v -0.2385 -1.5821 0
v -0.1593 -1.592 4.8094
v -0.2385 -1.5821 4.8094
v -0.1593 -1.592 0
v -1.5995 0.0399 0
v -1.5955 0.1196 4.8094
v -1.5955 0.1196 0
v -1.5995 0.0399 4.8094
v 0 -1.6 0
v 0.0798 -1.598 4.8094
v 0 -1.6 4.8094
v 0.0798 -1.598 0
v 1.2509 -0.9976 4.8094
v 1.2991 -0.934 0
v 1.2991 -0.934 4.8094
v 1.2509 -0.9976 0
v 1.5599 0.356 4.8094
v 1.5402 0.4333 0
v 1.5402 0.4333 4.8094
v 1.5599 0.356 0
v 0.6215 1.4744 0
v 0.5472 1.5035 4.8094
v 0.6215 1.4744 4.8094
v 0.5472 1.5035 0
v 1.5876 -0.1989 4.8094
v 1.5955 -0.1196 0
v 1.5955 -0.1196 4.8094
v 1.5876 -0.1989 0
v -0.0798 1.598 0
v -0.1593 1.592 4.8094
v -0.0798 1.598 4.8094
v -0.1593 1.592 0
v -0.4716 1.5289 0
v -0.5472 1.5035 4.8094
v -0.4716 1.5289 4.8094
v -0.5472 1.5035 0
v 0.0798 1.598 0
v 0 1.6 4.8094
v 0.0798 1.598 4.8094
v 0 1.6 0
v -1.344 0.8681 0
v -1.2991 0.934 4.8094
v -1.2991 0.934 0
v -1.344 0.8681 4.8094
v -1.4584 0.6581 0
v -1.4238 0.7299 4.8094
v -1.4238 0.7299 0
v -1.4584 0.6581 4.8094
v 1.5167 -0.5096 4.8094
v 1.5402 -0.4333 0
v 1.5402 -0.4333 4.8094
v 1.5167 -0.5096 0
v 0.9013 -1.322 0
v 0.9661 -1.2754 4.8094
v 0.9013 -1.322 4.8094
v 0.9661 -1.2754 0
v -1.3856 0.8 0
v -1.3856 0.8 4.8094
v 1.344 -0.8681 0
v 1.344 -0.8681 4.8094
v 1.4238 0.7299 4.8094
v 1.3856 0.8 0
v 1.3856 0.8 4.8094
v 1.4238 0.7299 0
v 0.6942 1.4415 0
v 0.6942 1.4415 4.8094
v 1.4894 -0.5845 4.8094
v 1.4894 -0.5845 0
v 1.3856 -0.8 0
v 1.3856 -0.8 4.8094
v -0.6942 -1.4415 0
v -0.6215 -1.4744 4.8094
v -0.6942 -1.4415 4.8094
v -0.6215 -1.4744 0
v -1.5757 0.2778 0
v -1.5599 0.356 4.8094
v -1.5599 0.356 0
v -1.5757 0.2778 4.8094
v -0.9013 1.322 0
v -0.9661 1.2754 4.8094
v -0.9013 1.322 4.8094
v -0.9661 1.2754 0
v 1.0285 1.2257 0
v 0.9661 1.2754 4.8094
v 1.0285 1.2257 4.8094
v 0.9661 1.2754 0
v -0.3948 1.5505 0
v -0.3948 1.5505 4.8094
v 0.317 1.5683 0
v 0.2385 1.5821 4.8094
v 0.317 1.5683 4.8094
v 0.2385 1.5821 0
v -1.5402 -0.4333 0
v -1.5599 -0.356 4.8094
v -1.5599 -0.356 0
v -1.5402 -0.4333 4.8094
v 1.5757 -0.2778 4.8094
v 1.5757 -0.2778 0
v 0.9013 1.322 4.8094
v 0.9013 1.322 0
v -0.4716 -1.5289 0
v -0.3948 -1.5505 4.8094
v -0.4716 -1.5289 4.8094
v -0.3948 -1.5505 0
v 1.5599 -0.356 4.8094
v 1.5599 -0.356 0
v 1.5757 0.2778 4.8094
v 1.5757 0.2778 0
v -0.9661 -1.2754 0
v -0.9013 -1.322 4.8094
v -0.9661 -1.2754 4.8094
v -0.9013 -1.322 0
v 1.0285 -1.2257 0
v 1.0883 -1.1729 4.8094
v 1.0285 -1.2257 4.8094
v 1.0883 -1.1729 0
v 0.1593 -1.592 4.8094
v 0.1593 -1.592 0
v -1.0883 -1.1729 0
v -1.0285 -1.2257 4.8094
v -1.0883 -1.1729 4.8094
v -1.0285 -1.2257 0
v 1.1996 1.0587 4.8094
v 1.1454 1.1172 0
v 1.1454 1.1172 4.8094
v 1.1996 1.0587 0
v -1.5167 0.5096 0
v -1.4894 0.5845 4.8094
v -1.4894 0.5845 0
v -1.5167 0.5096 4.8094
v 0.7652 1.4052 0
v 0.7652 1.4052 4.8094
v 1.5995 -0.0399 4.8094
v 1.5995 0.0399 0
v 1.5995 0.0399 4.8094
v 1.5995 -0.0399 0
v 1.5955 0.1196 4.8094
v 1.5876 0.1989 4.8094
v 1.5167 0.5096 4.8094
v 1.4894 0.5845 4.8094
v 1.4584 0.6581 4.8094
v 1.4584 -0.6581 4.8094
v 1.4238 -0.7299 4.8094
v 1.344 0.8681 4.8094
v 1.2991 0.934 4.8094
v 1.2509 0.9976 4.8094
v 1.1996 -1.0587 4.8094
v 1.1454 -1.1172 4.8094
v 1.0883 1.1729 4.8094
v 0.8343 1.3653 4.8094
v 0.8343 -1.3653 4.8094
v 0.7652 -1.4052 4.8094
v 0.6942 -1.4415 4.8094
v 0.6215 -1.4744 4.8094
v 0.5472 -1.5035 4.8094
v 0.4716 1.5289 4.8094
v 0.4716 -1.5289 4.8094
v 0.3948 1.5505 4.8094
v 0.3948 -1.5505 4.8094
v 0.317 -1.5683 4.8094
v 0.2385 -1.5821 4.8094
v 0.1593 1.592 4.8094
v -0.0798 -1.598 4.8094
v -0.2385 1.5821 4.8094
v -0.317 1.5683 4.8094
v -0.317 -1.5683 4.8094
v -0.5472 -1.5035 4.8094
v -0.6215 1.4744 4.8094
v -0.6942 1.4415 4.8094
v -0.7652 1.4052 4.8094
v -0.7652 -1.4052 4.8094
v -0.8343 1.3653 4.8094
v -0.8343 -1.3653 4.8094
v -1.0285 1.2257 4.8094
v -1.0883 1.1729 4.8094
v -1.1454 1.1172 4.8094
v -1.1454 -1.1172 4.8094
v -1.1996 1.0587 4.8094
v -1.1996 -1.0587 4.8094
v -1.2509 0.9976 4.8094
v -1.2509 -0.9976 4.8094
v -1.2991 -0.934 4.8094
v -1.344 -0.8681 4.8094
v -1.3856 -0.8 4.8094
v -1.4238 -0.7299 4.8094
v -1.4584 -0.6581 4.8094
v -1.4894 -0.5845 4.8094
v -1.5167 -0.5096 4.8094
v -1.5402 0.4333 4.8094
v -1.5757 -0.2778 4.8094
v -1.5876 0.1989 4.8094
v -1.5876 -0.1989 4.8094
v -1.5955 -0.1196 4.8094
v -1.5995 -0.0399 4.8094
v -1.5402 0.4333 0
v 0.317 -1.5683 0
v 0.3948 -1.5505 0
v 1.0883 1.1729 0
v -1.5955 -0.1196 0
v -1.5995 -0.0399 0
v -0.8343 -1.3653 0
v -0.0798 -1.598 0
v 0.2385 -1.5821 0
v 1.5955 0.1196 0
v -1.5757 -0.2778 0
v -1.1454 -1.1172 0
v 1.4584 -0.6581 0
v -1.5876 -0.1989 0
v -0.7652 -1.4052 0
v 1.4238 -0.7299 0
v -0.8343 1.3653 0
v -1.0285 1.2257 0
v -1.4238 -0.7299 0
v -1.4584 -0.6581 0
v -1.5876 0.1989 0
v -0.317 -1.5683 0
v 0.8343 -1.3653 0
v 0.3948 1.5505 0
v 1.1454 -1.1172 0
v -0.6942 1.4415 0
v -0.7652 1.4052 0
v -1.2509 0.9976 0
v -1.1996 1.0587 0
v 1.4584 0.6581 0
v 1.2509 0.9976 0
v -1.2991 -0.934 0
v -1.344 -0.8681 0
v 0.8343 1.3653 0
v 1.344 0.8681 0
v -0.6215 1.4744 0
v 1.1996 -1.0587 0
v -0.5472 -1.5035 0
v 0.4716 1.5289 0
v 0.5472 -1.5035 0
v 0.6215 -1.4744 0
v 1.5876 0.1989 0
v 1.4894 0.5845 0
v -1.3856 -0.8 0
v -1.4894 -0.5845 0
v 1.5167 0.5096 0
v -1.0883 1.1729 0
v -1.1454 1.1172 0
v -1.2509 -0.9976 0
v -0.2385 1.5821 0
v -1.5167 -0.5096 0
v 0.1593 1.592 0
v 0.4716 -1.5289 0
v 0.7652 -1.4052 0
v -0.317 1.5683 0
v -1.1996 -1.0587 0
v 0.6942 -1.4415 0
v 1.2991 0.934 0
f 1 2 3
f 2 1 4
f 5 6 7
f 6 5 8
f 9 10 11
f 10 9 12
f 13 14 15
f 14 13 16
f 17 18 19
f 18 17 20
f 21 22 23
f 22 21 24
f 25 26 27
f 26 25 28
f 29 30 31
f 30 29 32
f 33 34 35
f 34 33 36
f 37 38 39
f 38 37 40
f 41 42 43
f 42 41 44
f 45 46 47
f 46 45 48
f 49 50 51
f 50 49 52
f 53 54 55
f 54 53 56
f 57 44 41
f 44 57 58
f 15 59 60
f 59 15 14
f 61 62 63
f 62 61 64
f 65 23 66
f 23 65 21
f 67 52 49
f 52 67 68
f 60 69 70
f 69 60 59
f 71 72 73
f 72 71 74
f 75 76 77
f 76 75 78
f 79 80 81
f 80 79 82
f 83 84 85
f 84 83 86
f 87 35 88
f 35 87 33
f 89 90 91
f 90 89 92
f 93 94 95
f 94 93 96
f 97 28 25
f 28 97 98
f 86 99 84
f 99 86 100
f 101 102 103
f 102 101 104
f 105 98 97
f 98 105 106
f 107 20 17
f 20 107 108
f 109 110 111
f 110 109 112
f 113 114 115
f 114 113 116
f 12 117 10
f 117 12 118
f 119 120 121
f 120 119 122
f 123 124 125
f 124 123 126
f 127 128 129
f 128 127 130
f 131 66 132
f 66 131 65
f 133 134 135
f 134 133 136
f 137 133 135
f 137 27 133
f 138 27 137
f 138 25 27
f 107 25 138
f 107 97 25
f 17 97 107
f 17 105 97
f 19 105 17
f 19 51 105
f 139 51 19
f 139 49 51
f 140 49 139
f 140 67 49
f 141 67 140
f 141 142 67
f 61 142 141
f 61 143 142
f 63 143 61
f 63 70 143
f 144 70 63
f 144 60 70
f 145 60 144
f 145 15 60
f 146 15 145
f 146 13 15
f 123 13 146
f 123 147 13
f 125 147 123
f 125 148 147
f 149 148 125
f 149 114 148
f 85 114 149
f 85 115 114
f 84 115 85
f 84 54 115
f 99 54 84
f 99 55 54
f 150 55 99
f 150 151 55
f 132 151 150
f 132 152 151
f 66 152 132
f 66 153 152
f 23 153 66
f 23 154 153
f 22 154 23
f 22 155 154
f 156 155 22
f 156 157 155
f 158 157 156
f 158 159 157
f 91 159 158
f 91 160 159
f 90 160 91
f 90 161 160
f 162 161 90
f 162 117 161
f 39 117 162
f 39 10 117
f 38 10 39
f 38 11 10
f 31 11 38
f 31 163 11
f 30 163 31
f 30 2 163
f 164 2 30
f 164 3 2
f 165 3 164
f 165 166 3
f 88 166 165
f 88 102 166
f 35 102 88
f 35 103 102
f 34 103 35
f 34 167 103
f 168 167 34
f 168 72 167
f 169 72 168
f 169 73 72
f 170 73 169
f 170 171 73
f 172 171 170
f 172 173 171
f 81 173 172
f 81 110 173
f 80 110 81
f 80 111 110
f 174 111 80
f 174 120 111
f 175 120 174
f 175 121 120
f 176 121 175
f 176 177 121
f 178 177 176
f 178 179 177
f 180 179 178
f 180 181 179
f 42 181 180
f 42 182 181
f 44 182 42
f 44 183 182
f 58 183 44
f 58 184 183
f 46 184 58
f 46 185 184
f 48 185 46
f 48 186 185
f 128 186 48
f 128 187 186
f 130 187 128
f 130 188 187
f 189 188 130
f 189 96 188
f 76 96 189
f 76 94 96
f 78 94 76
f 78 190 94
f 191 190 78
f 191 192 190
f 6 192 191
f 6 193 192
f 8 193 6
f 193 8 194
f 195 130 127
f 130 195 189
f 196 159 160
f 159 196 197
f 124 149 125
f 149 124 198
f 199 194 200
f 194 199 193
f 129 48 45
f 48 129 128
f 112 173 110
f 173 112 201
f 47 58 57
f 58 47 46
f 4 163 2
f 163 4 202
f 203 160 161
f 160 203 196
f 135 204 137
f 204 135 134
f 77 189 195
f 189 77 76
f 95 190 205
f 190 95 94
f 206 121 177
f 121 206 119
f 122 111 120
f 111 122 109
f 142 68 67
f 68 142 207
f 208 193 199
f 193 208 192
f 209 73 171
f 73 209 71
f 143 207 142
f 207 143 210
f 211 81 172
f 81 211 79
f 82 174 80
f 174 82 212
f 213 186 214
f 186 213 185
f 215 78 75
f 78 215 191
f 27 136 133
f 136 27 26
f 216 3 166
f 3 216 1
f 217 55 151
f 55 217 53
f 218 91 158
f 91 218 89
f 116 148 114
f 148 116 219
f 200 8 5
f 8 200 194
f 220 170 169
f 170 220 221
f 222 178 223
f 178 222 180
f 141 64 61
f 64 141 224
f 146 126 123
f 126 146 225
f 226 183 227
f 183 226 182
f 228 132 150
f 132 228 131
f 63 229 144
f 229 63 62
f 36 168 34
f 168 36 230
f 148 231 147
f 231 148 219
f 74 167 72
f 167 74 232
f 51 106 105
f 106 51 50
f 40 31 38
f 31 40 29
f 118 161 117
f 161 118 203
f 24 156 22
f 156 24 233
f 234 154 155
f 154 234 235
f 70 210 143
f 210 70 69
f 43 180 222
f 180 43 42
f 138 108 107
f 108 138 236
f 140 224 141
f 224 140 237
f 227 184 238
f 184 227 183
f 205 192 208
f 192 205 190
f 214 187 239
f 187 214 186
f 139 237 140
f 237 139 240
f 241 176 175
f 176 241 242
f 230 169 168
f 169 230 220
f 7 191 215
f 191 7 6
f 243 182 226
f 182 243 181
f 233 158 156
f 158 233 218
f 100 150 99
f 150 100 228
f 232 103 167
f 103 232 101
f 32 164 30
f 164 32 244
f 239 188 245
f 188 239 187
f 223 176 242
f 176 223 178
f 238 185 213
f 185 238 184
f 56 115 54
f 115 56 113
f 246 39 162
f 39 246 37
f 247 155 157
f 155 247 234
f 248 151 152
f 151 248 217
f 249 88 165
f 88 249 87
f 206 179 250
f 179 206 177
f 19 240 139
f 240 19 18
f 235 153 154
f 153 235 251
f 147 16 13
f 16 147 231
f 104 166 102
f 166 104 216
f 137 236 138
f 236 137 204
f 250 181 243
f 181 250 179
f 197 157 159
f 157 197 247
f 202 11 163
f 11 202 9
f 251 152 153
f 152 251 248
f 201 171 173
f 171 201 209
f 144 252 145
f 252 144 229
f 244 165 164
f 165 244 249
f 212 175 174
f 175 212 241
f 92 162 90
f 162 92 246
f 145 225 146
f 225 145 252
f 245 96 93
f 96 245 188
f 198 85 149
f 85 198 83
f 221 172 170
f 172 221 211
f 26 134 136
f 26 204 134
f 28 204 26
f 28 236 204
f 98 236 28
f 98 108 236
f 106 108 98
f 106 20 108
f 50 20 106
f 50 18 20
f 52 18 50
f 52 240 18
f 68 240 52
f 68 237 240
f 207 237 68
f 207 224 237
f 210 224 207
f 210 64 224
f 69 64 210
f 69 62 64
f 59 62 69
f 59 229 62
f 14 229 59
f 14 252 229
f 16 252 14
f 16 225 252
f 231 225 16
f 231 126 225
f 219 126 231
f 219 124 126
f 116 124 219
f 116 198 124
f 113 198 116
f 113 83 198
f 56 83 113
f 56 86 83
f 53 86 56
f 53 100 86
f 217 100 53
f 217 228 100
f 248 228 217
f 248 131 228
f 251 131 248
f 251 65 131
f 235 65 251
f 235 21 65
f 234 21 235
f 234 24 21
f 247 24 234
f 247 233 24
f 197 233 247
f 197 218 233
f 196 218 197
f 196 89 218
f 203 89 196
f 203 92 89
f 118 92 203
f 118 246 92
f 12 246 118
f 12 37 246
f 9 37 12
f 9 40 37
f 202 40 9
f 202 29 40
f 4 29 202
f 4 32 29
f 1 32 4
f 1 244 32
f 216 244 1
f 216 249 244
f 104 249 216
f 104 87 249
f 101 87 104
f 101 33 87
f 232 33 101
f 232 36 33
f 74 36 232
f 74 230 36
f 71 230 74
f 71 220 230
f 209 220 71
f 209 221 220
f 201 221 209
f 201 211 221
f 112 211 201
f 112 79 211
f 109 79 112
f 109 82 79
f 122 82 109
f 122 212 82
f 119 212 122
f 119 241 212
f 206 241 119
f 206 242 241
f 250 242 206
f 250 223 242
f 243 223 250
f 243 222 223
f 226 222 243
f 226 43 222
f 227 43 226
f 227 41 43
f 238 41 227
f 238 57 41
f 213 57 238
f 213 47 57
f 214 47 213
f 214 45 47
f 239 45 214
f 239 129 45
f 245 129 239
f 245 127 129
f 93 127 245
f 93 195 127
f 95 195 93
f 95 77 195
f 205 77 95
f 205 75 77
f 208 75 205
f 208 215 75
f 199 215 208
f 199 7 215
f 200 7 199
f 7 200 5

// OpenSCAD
// file: ../p/stud.scad
use <../lib.scad>
use <4-4cyli.scad>
use <4-4disc.scad>
use <4-4edge.scad>
$fa=1; $fs=0.2;
function ldraw_lib__stud(realsolid=false) = realsolid ? 
    [openscad(translate([0,0,-eps()], o=cylinder(4+eps(), r=6)),2)] : [
// 0 Stud
// 0 Name: stud.dat
// 0 Author: James Jessiman
// 0 !LDRAW_ORG Primitive UPDATE 2012-01
// 0 !LICENSE Licensed under CC BY 2.0 and CC BY 4.0 : see CAreadme.txt
// 
// 0 BFC CERTIFY CCW
  [0,"BFC","CERTIFY"],
  [0,"BFC","CCW"],
// 
// 0 !HISTORY 2002-04-04 [sbliss] Modified for BFC compliance
// 0 !HISTORY 2002-04-25 [PTadmin] Official Update 2002-02
// 0 !HISTORY 2007-06-24 [PTadmin] Header formatted for Contributor Agreement
// 0 !HISTORY 2008-07-01 [PTadmin] Official Update 2008-01
// 0 !HISTORY 2012-02-16 [Philo] Changed to CCW
// 0 !HISTORY 2012-03-30 [PTadmin] Official Update 2012-01
// 
// 
// 1 16 0 0 0 6 0 0 0 1 0 0 0 6 4-4edge.dat
  [1,16,0,0,0,6,0,0,0,1,0,0,0,6, ldraw_lib__4_4edge(realsolid)],
// 1 16 0 -4 0 6 0 0 0 1 0 0 0 6 4-4edge.dat
  [1,16,0,-4,0,6,0,0,0,1,0,0,0,6, ldraw_lib__4_4edge(realsolid)],
// 1 16 0 0 0 6 0 0 0 -4 0 0 0 6 4-4cyli.dat
  [1,16,0,0,0,6,0,0,0,-4,0,0,0,6, ldraw_lib__4_4cyli(realsolid)],
// 1 16 0 -4 0 6 0 0 0 1 0 0 0 6 4-4disc.dat
  [1,16,0,-4,0,6,0,0,0,1,0,0,0,6, ldraw_lib__4_4disc(realsolid)],
];
module ldraw_lib__stud(step=0, col=false, unit=2/5, alt=false, line=0.2, solid=!$preview)
    makepoly(ldraw_lib__stud(solid), step=step, col=col, unit=unit, alt=alt, line=line, solid=solid);
ldraw_lib__stud(line=0.2);
// file: ../p/box4t.scad
use <../lib.scad>
$fa=1; $fs=0.2;
function ldraw_lib__box4t(realsolid=false) = [
// 0 Box with 4 Adjacent Faces and All Edges
// 0 Name: box4t.dat
// 0 Author: Tore Eriksson [Tore_Eriksson]
// 0 !LDRAW_ORG Primitive UPDATE 2003-02
// 0 !LICENSE Licensed under CC BY 2.0 and CC BY 4.0 : see CAreadme.txt
// 
// 0 BFC CERTIFY CCW
  [0,"BFC","CERTIFY"],
  [0,"BFC","CCW"],
// 
// 0 !HISTORY 1997-09-29 [PTadmin] Official Update 1997-15
// 0 !HISTORY 2002-08-31 [izanette] Modified with WINDZ for BFC compliance
// 0 !HISTORY 2003-08-01 [PTadmin] Official Update 2003-02
// 0 !HISTORY 2007-06-24 [PTadmin] Header formatted for Contributor Agreement
// 0 !HISTORY 2008-07-01 [PTadmin] Official Update 2008-01
// 
// 
// 2 24 1 1 1 -1 1 1
  [2,24,1,1,1,-1,1,1],
// 2 24 -1 1 1 -1 1 -1
  [2,24,-1,1,1,-1,1,-1],
// 2 24 -1 1 -1 1 1 -1
  [2,24,-1,1,-1,1,1,-1],
// 2 24 1 1 -1 1 1 1
  [2,24,1,1,-1,1,1,1],
// 2 24 1 0 1 -1 0 1
  [2,24,1,0,1,-1,0,1],
// 2 24 -1 0 1 -1 0 -1
  [2,24,-1,0,1,-1,0,-1],
// 2 24 -1 0 -1 1 0 -1
  [2,24,-1,0,-1,1,0,-1],
// 2 24 1 0 -1 1 0 1
  [2,24,1,0,-1,1,0,1],
// 2 24 1 0 1 1 1 1
  [2,24,1,0,1,1,1,1],
// 2 24 -1 0 1 -1 1 1
  [2,24,-1,0,1,-1,1,1],
// 2 24 1 0 -1 1 1 -1
  [2,24,1,0,-1,1,1,-1],
// 2 24 -1 0 -1 -1 1 -1
  [2,24,-1,0,-1,-1,1,-1],
// 4 16 1 1 1 1 1 -1 -1 1 -1 -1 1 1
  [4,16,1,1,1,1,1,-1,-1,1,-1,-1,1,1],
// 4 16 1 1 1 -1 1 1 -1 0 1 1 0 1
  [4,16,1,1,1,-1,1,1,-1,0,1,1,0,1],
// 4 16 -1 1 1 -1 1 -1 -1 0 -1 -1 0 1
  [4,16,-1,1,1,-1,1,-1,-1,0,-1,-1,0,1],
// 0 4 16 -1 1 -1 -1 0 -1 1 0 -1 1 1 -1
// 4 16 1 1 -1 1 1 1 1 0 1 1 0 -1
  [4,16,1,1,-1,1,1,1,1,0,1,1,0,-1],
// 0
];
module ldraw_lib__box4t(step=0, col=false, unit=2/5, alt=false, line=0.2, solid=!$preview)
    makepoly(ldraw_lib__box4t(solid), step=step, col=col, unit=unit, alt=alt, line=line, solid=solid);
ldraw_lib__box4t(line=0.2);
// file: ../p/4-4edge.scad
use <../lib.scad>
$fa=1; $fs=0.2;
function ldraw_lib__4_4edge(realsolid=false) = [
// 0 Circle 1.0
// 0 Name: 4-4edge.dat
// 0 Author: James Jessiman
// 0 !LDRAW_ORG Primitive UPDATE 2017-01
// 0 !LICENSE Licensed under CC BY 2.0 and CC BY 4.0 : see CAreadme.txt
// 
// 0 BFC CERTIFY CCW
  [0,"BFC","CERTIFY"],
  [0,"BFC","CCW"],
// 
// 0 !HISTORY 1998-12-15 [PTadmin] Official Update 1998-10
// 0 !HISTORY 2005-12-28 [PTadmin] Official Update 2005-01
// 0 !HISTORY 2007-06-24 [PTadmin] Header formatted for Contributor Agreement
// 0 !HISTORY 2008-07-01 [PTadmin] Official Update 2008-01
// 0 !HISTORY 2017-01-15 [Steffen] BFCed
// 0 !HISTORY 2017-12-30 [PTadmin] Official Update 2017-01
// 
// 
// 2 24 1 0 0 0.9239 0 0.3827
  [2,24,1,0,0,0.9239,0,0.3827],
// 2 24 0.9239 0 0.3827 0.7071 0 0.7071
  [2,24,0.9239,0,0.3827,0.7071,0,0.7071],
// 2 24 0.7071 0 0.7071 0.3827 0 0.9239
  [2,24,0.7071,0,0.7071,0.3827,0,0.9239],
// 2 24 0.3827 0 0.9239 0 0 1
  [2,24,0.3827,0,0.9239,0,0,1],
// 2 24 0 0 1 -0.3827 0 0.9239
  [2,24,0,0,1,-0.3827,0,0.9239],
// 2 24 -0.3827 0 0.9239 -0.7071 0 0.7071
  [2,24,-0.3827,0,0.9239,-0.7071,0,0.7071],
// 2 24 -0.7071 0 0.7071 -0.9239 0 0.3827
  [2,24,-0.7071,0,0.7071,-0.9239,0,0.3827],
// 2 24 -0.9239 0 0.3827 -1 0 -0
  [2,24,-0.9239,0,0.3827,-1,0,-0],
// 2 24 -1 0 -0 -0.9239 0 -0.3827
  [2,24,-1,0,-0,-0.9239,0,-0.3827],
// 2 24 -0.9239 0 -0.3827 -0.7071 0 -0.7071
  [2,24,-0.9239,0,-0.3827,-0.7071,0,-0.7071],
// 2 24 -0.7071 0 -0.7071 -0.3827 0 -0.9239
  [2,24,-0.7071,0,-0.7071,-0.3827,0,-0.9239],
// 2 24 -0.3827 0 -0.9239 0 0 -1
  [2,24,-0.3827,0,-0.9239,0,0,-1],
// 2 24 0 0 -1 0.3827 0 -0.9239
  [2,24,0,0,-1,0.3827,0,-0.9239],
// 2 24 0.3827 0 -0.9239 0.7071 0 -0.7071
  [2,24,0.3827,0,-0.9239,0.7071,0,-0.7071],
// 2 24 0.7071 0 -0.7071 0.9239 0 -0.3827
  [2,24,0.7071,0,-0.7071,0.9239,0,-0.3827],
// 2 24 0.9239 0 -0.3827 1 0 0
  [2,24,0.9239,0,-0.3827,1,0,0],
];
module ldraw_lib__4_4edge(step=0, col=false, unit=2/5, alt=false, line=0.2, solid=!$preview)
    makepoly(ldraw_lib__4_4edge(solid), step=step, col=col, unit=unit, alt=alt, line=line, solid=solid);
ldraw_lib__4_4edge(line=0.2);
// file: ../p/4-4disc.scad
use <../lib.scad>
$fa=1; $fs=0.2;
function ldraw_lib__4_4disc(realsolid=false) = [
// 0 Disc 1.0
// 0 Name: 4-4disc.dat
// 0 Author: James Jessiman
// 0 !LDRAW_ORG Primitive UPDATE 2002-02
// 0 !LICENSE Licensed under CC BY 2.0 and CC BY 4.0 : see CAreadme.txt
// 
// 0 BFC CERTIFY CCW
  [0,"BFC","CERTIFY"],
  [0,"BFC","CCW"],
// 
// 0 !HISTORY 1998-12-15 [PTadmin] Official Update 1998-10
// 0 !HISTORY 2002-03-23 [sbliss] Added BFC statement
// 0 !HISTORY 2002-04-25 [PTadmin] Official Update 2002-02
// 0 !HISTORY 2007-06-24 [PTadmin] Header formatted for Contributor Agreement
// 0 !HISTORY 2008-07-01 [PTadmin] Official Update 2008-01
// 
// 
// 3 16 0 0 0 1 0 0 0.9239 0 0.3827
  [3,16,0,0,0,1,0,0,0.9239,0,0.3827],
// 3 16 0 0 0 0.9239 0 0.3827 0.7071 0 0.7071
  [3,16,0,0,0,0.9239,0,0.3827,0.7071,0,0.7071],
// 3 16 0 0 0 0.7071 0 0.7071 0.3827 0 0.9239
  [3,16,0,0,0,0.7071,0,0.7071,0.3827,0,0.9239],
// 3 16 0 0 0 0.3827 0 0.9239 0 0 1
  [3,16,0,0,0,0.3827,0,0.9239,0,0,1],
// 3 16 0 0 0 0 0 1 -0.3827 0 0.9239
  [3,16,0,0,0,0,0,1,-0.3827,0,0.9239],
// 3 16 0 0 0 -0.3827 0 0.9239 -0.7071 0 0.7071
  [3,16,0,0,0,-0.3827,0,0.9239,-0.7071,0,0.7071],
// 3 16 0 0 0 -0.7071 0 0.7071 -0.9239 0 0.3827
  [3,16,0,0,0,-0.7071,0,0.7071,-0.9239,0,0.3827],
// 3 16 0 0 0 -0.9239 0 0.3827 -1 0 -0
  [3,16,0,0,0,-0.9239,0,0.3827,-1,0,-0],
// 3 16 0 0 0 -1 0 -0 -0.9239 0 -0.3827
  [3,16,0,0,0,-1,0,-0,-0.9239,0,-0.3827],
// 3 16 0 0 0 -0.9239 0 -0.3827 -0.7071 0 -0.7071
  [3,16,0,0,0,-0.9239,0,-0.3827,-0.7071,0,-0.7071],
// 3 16 0 0 0 -0.7071 0 -0.7071 -0.3827 0 -0.9239
  [3,16,0,0,0,-0.7071,0,-0.7071,-0.3827,0,-0.9239],
// 3 16 0 0 0 -0.3827 0 -0.9239 0 0 -1
  [3,16,0,0,0,-0.3827,0,-0.9239,0,0,-1],
// 3 16 0 0 0 0 0 -1 0.3827 0 -0.9239
  [3,16,0,0,0,0,0,-1,0.3827,0,-0.9239],
// 3 16 0 0 0 0.3827 0 -0.9239 0.7071 0 -0.7071
  [3,16,0,0,0,0.3827,0,-0.9239,0.7071,0,-0.7071],
// 3 16 0 0 0 0.7071 0 -0.7071 0.9239 0 -0.3827
  [3,16,0,0,0,0.7071,0,-0.7071,0.9239,0,-0.3827],
// 3 16 0 0 0 0.9239 0 -0.3827 1 0 0
  [3,16,0,0,0,0.9239,0,-0.3827,1,0,0],
// 0
];
module ldraw_lib__4_4disc(step=0, col=false, unit=2/5, alt=false, line=0.2, solid=!$preview)
    makepoly(ldraw_lib__4_4disc(solid), step=step, col=col, unit=unit, alt=alt, line=line, solid=solid);
ldraw_lib__4_4disc(line=0.2);
// file: ../p/4-4cyli.scad
use <../lib.scad>
$fa=1; $fs=0.2;
function ldraw_lib__4_4cyli(realsolid=false) = [
// 0 Cylinder 1.0
// 0 Name: 4-4cyli.dat
// 0 Author: James Jessiman
// 0 !LDRAW_ORG Primitive UPDATE 2005-01
// 0 !LICENSE Licensed under CC BY 2.0 and CC BY 4.0 : see CAreadme.txt
// 
// 0 BFC CERTIFY CCW
  [0,"BFC","CERTIFY"],
  [0,"BFC","CCW"],
// 
// 0 !HISTORY 1998-12-15 [PTadmin] Official Update 1998-10
// 0 !HISTORY 2002-03-23 [sbliss] Added BFC statement; merged headers from files in distributions LDraw 0.27 and Complete.
// 0 !HISTORY 2002-04-25 [PTadmin] Official Update 2002-02
// 0 !HISTORY 2004-12-14 [guyvivan] BFC CCW
// 0 !HISTORY 2005-12-28 [PTadmin] Official Update 2005-01
// 0 !HISTORY 2007-06-24 [PTadmin] Header formatted for Contributor Agreement
// 0 !HISTORY 2008-07-01 [PTadmin] Official Update 2008-01
// 
// 
// 4 16 1 1 0 0.9239 1 0.3827 0.9239 0 0.3827 1 0 0
  [4,16,1,1,0,0.9239,1,0.3827,0.9239,0,0.3827,1,0,0],
// 5 24 1 0 0 1 1 0 0.9239 0 0.3827 0.9239 0 -0.3827
  [5,24,1,0,0,1,1,0,0.9239,0,0.3827,0.9239,0,-0.3827],
// 4 16 0.9239 1 0.3827 0.7071 1 0.7071 0.7071 0 0.7071 0.9239 0 0.3827
  [4,16,0.9239,1,0.3827,0.7071,1,0.7071,0.7071,0,0.7071,0.9239,0,0.3827],
// 5 24 0.9239 0 0.3827 0.9239 1 0.3827 0.7071 0 0.7071 1 0 0
  [5,24,0.9239,0,0.3827,0.9239,1,0.3827,0.7071,0,0.7071,1,0,0],
// 4 16 0.7071 1 0.7071 0.3827 1 0.9239 0.3827 0 0.9239 0.7071 0 0.7071
  [4,16,0.7071,1,0.7071,0.3827,1,0.9239,0.3827,0,0.9239,0.7071,0,0.7071],
// 5 24 0.7071 0 0.7071 0.7071 1 0.7071 0.3827 0 0.9239 0.9239 0 0.3827
  [5,24,0.7071,0,0.7071,0.7071,1,0.7071,0.3827,0,0.9239,0.9239,0,0.3827],
// 4 16 0.3827 1 0.9239 0 1 1 0 0 1 0.3827 0 0.9239
  [4,16,0.3827,1,0.9239,0,1,1,0,0,1,0.3827,0,0.9239],
// 5 24 0.3827 0 0.9239 0.3827 1 0.9239 0 0 1 0.7071 0 0.7071
  [5,24,0.3827,0,0.9239,0.3827,1,0.9239,0,0,1,0.7071,0,0.7071],
// 4 16 0 1 1 -0.3827 1 0.9239 -0.3827 0 0.9239 0 0 1
  [4,16,0,1,1,-0.3827,1,0.9239,-0.3827,0,0.9239,0,0,1],
// 5 24 0 0 1 0 1 1 -0.3827 0 0.9239 0.3827 0 0.9239
  [5,24,0,0,1,0,1,1,-0.3827,0,0.9239,0.3827,0,0.9239],
// 4 16 -0.3827 1 0.9239 -0.7071 1 0.7071 -0.7071 0 0.7071 -0.3827 0 0.9239
  [4,16,-0.3827,1,0.9239,-0.7071,1,0.7071,-0.7071,0,0.7071,-0.3827,0,0.9239],
// 5 24 -0.3827 0 0.9239 -0.3827 1 0.9239 -0.7071 0 0.7071 0 0 1
  [5,24,-0.3827,0,0.9239,-0.3827,1,0.9239,-0.7071,0,0.7071,0,0,1],
// 4 16 -0.7071 1 0.7071 -0.9239 1 0.3827 -0.9239 0 0.3827 -0.7071 0 0.7071
  [4,16,-0.7071,1,0.7071,-0.9239,1,0.3827,-0.9239,0,0.3827,-0.7071,0,0.7071],
// 5 24 -0.7071 0 0.7071 -0.7071 1 0.7071 -0.9239 0 0.3827 -0.3827 0 0.9239
  [5,24,-0.7071,0,0.7071,-0.7071,1,0.7071,-0.9239,0,0.3827,-0.3827,0,0.9239],
// 4 16 -0.9239 1 0.3827 -1 1 0 -1 0 0 -0.9239 0 0.3827
  [4,16,-0.9239,1,0.3827,-1,1,0,-1,0,0,-0.9239,0,0.3827],
// 5 24 -0.9239 0 0.3827 -0.9239 1 0.3827 -1 0 0 -0.7071 0 0.7071
  [5,24,-0.9239,0,0.3827,-0.9239,1,0.3827,-1,0,0,-0.7071,0,0.7071],
// 4 16 -1 1 0 -0.9239 1 -0.3827 -0.9239 0 -0.3827 -1 0 0
  [4,16,-1,1,0,-0.9239,1,-0.3827,-0.9239,0,-0.3827,-1,0,0],
// 5 24 -1 0 0 -1 1 0 -0.9239 0 -0.3827 -0.9239 0 0.3827
  [5,24,-1,0,0,-1,1,0,-0.9239,0,-0.3827,-0.9239,0,0.3827],
// 4 16 -0.9239 1 -0.3827 -0.7071 1 -0.7071 -0.7071 0 -0.7071 -0.9239 0 -0.3827
  [4,16,-0.9239,1,-0.3827,-0.7071,1,-0.7071,-0.7071,0,-0.7071,-0.9239,0,-0.3827],
// 5 24 -0.9239 0 -0.3827 -0.9239 1 -0.3827 -0.7071 0 -0.7071 -1 0 0
  [5,24,-0.9239,0,-0.3827,-0.9239,1,-0.3827,-0.7071,0,-0.7071,-1,0,0],
// 4 16 -0.7071 1 -0.7071 -0.3827 1 -0.9239 -0.3827 0 -0.9239 -0.7071 0 -0.7071
  [4,16,-0.7071,1,-0.7071,-0.3827,1,-0.9239,-0.3827,0,-0.9239,-0.7071,0,-0.7071],
// 5 24 -0.7071 0 -0.7071 -0.7071 1 -0.7071 -0.3827 0 -0.9239 -0.9239 0 -0.3827
  [5,24,-0.7071,0,-0.7071,-0.7071,1,-0.7071,-0.3827,0,-0.9239,-0.9239,0,-0.3827],
// 4 16 -0.3827 1 -0.9239 0 1 -1 0 0 -1 -0.3827 0 -0.9239
  [4,16,-0.3827,1,-0.9239,0,1,-1,0,0,-1,-0.3827,0,-0.9239],
// 5 24 -0.3827 0 -0.9239 -0.3827 1 -0.9239 0 0 -1 -0.7071 0 -0.7071
  [5,24,-0.3827,0,-0.9239,-0.3827,1,-0.9239,0,0,-1,-0.7071,0,-0.7071],
// 4 16 0 1 -1 0.3827 1 -0.9239 0.3827 0 -0.9239 0 0 -1
  [4,16,0,1,-1,0.3827,1,-0.9239,0.3827,0,-0.9239,0,0,-1],
// 5 24 0 0 -1 0 1 -1 0.3827 0 -0.9239 -0.3827 0 -0.9239
  [5,24,0,0,-1,0,1,-1,0.3827,0,-0.9239,-0.3827,0,-0.9239],
// 4 16 0.3827 1 -0.9239 0.7071 1 -0.7071 0.7071 0 -0.7071 0.3827 0 -0.9239
  [4,16,0.3827,1,-0.9239,0.7071,1,-0.7071,0.7071,0,-0.7071,0.3827,0,-0.9239],
// 5 24 0.3827 0 -0.9239 0.3827 1 -0.9239 0.7071 0 -0.7071 0 0 -1
  [5,24,0.3827,0,-0.9239,0.3827,1,-0.9239,0.7071,0,-0.7071,0,0,-1],
// 4 16 0.7071 1 -0.7071 0.9239 1 -0.3827 0.9239 0 -0.3827 0.7071 0 -0.7071
  [4,16,0.7071,1,-0.7071,0.9239,1,-0.3827,0.9239,0,-0.3827,0.7071,0,-0.7071],
// 5 24 0.7071 0 -0.7071 0.7071 1 -0.7071 0.9239 0 -0.3827 0.3827 0 -0.9239
  [5,24,0.7071,0,-0.7071,0.7071,1,-0.7071,0.9239,0,-0.3827,0.3827,0,-0.9239],
// 4 16 0.9239 1 -0.3827 1 1 0 1 0 0 0.9239 0 -0.3827
  [4,16,0.9239,1,-0.3827,1,1,0,1,0,0,0.9239,0,-0.3827],
// 5 24 0.9239 0 -0.3827 0.9239 1 -0.3827 1 0 0 0.7071 0 -0.7071
  [5,24,0.9239,0,-0.3827,0.9239,1,-0.3827,1,0,0,0.7071,0,-0.7071],
// 0
];
module ldraw_lib__4_4cyli(step=0, col=false, unit=2/5, alt=false, line=0.2, solid=!$preview)
    makepoly(ldraw_lib__4_4cyli(solid), step=step, col=col, unit=unit, alt=alt, line=line, solid=solid);
ldraw_lib__4_4cyli(line=0.2);
// file: s/3004s01.scad
use <../../lib.scad>
use <../../p/box4t.scad>
use <../../p/box5.scad>
use <../../p/stud.scad>
use <../../p/stud3.scad>
$fa=1; $fs=0.2;
function ldraw_lib__s__3004s01(realsolid=false) = [
// 0 ~Brick  1 x  2 without Front Face
// 0 Name: s\3004s01.dat
// 0 Author: James Jessiman
// 0 !LDRAW_ORG Subpart UPDATE 2003-03
// 0 !LICENSE Licensed under CC BY 2.0 and CC BY 4.0 : see CAreadme.txt
// 
// 0 BFC CERTIFY CCW
  [0,"BFC","CERTIFY"],
  [0,"BFC","CCW"],
// 
// 0 !HISTORY 2003-09-07 [jriley] Subfiling, BFC
// 0 !HISTORY 2003-12-19 [PTadmin] Official Update 2003-03
// 0 !HISTORY 2007-08-29 [PTadmin] Header formatted for Contributor Agreement
// 0 !HISTORY 2008-07-01 [PTadmin] Official Update 2008-01
// 
// 
// 1 16 0 4 0 1 0 0 0 -5 0 0 0 1 stud3.dat
  [1,16,0,4,0,1,0,0,0,-5,0,0,0,1, ldraw_lib__stud3(realsolid)],
// 0 BFC INVERTNEXT
  [0,"BFC","INVERTNEXT"],
// 1 16 0 24 0 16 0 0 0 -20 0 0 0 6 box5.dat
  [1,16,0,24,0,16,0,0,0,-20,0,0,0,6, ldraw_lib__box5(realsolid)],
// 4 16 20 24 10 16 24 6 -16 24 6 -20 24 10
  [4,16,20,24,10,16,24,6,-16,24,6,-20,24,10],
// 4 16 -20 24 10 -16 24 6 -16 24 -6 -20 24 -10
  [4,16,-20,24,10,-16,24,6,-16,24,-6,-20,24,-10],
// 4 16 -20 24 -10 -16 24 -6 16 24 -6 20 24 -10
  [4,16,-20,24,-10,-16,24,-6,16,24,-6,20,24,-10],
// 4 16 20 24 -10 16 24 -6 16 24 6 20 24 10
  [4,16,20,24,-10,16,24,-6,16,24,6,20,24,10],
// 1 16 0 24 0 20 0 0 0 -24 0 0 0 10 box4t.dat
  [1,16,0,24,0,20,0,0,0,-24,0,0,0,10, ldraw_lib__box4t(realsolid)],
// 1 16 10 0 0 1 0 0 0 1 0 0 0 1 stud.dat
  [1,16,10,0,0,1,0,0,0,1,0,0,0,1, ldraw_lib__stud(realsolid)],
// 1 16 -10 0 0 1 0 0 0 1 0 0 0 1 stud.dat
  [1,16,-10,0,0,1,0,0,0,1,0,0,0,1, ldraw_lib__stud(realsolid)],
// 0
];
module ldraw_lib__s__3004s01(step=0, col=false, unit=2/5, alt=false, line=0.2, solid=!$preview)
    makepoly(ldraw_lib__s__3004s01(solid), step=step, col=col, unit=unit, alt=alt, line=line, solid=solid);
ldraw_lib__s__3004s01(line=0.2);
// file: ../p/stud3.scad
use <../lib.scad>
use <4-4cyli.scad>
use <4-4disc.scad>
use <4-4edge.scad>
$fa=1; $fs=0.2;
function ldraw_lib__stud3(realsolid=false) = realsolid ? 
    [openscad(translate([0,0,-eps()], o=cylinder(4+eps(), r=4)),2)] : [
// 0 Stud Tube Solid
// 0 Name: stud3.dat
// 0 Author: James Jessiman
// 0 !LDRAW_ORG Primitive UPDATE 2012-01
// 0 !LICENSE Licensed under CC BY 2.0 and CC BY 4.0 : see CAreadme.txt
// 
// 0 BFC CERTIFY CCW
  [0,"BFC","CERTIFY"],
  [0,"BFC","CCW"],
// 
// 0 !HISTORY 2002-04-04 [sbliss] Modified for BFC compliance
// 0 !HISTORY 2002-04-25 [PTadmin] Official Update 2002-02
// 0 !HISTORY 2007-06-24 [PTadmin] Header formatted for Contributor Agreement
// 0 !HISTORY 2008-07-01 [PTadmin] Official Update 2008-01
// 0 !HISTORY 2012-02-16 [Philo] Changed to CCW
// 0 !HISTORY 2012-03-30 [PTadmin] Official Update 2012-01
// 
// 
// 1 16 0 -4 0 4 0 0 0 1 0 0 0 4 4-4edge.dat
  [1,16,0,-4,0,4,0,0,0,1,0,0,0,4, ldraw_lib__4_4edge(realsolid)],
// 1 16 0 0 0 4 0 0 0 1 0 0 0 4 4-4edge.dat
  [1,16,0,0,0,4,0,0,0,1,0,0,0,4, ldraw_lib__4_4edge(realsolid)],
// 1 16 0 -4 0 4 0 0 0 1 0 0 0 4 4-4disc.dat
  [1,16,0,-4,0,4,0,0,0,1,0,0,0,4, ldraw_lib__4_4disc(realsolid)],
// 1 16 0 -4 0 4 0 0 0 4 0 0 0 4 4-4cyli.dat
  [1,16,0,-4,0,4,0,0,0,4,0,0,0,4, ldraw_lib__4_4cyli(realsolid)],
];
module ldraw_lib__stud3(step=0, col=false, unit=2/5, alt=false, line=0.2, solid=!$preview)
    makepoly(ldraw_lib__stud3(solid), step=step, col=col, unit=unit, alt=alt, line=line, solid=solid);
ldraw_lib__stud3(line=0.2);
// file: ../p/box5.scad
use <../lib.scad>
$fa=1; $fs=0.2;
function ldraw_lib__box5(realsolid=false) = [
// 0 Box with 5 Faces and All Edges
// 0 Name: box5.dat
// 0 Author: James Jessiman
// 0 !LDRAW_ORG Primitive UPDATE 2012-01
// 0 !LICENSE Licensed under CC BY 2.0 and CC BY 4.0 : see CAreadme.txt
// 
// 0 BFC CERTIFY CCW
  [0,"BFC","CERTIFY"],
  [0,"BFC","CCW"],
// 
// 0 !HISTORY 2002-04-03 [sbliss] Modified for BFC compliance
// 0 !HISTORY 2002-04-25 [PTadmin] Official Update 2002-02
// 0 !HISTORY 2007-06-24 [PTadmin] Header formatted for Contributor Agreement
// 0 !HISTORY 2008-07-01 [PTadmin] Official Update 2008-01
// 0 !HISTORY 2012-02-16 [Philo] Changed to CCW
// 0 !HISTORY 2012-03-30 [PTadmin] Official Update 2012-01
// 
// 
// 2 24 1 1 1 -1 1 1
  [2,24,1,1,1,-1,1,1],
// 2 24 -1 1 1 -1 1 -1
  [2,24,-1,1,1,-1,1,-1],
// 2 24 -1 1 -1 1 1 -1
  [2,24,-1,1,-1,1,1,-1],
// 2 24 1 1 -1 1 1 1
  [2,24,1,1,-1,1,1,1],
// 2 24 1 0 1 -1 0 1
  [2,24,1,0,1,-1,0,1],
// 2 24 -1 0 1 -1 0 -1
  [2,24,-1,0,1,-1,0,-1],
// 2 24 -1 0 -1 1 0 -1
  [2,24,-1,0,-1,1,0,-1],
// 2 24 1 0 -1 1 0 1
  [2,24,1,0,-1,1,0,1],
// 2 24 1 0 1 1 1 1
  [2,24,1,0,1,1,1,1],
// 2 24 -1 0 1 -1 1 1
  [2,24,-1,0,1,-1,1,1],
// 2 24 1 0 -1 1 1 -1
  [2,24,1,0,-1,1,1,-1],
// 2 24 -1 0 -1 -1 1 -1
  [2,24,-1,0,-1,-1,1,-1],
// 4 16 -1 1 1 1 1 1 1 1 -1 -1 1 -1
  [4,16,-1,1,1,1,1,1,1,1,-1,-1,1,-1],
// 4 16 -1 1 1 -1 0 1 1 0 1 1 1 1
  [4,16,-1,1,1,-1,0,1,1,0,1,1,1,1],
// 4 16 -1 1 -1 -1 0 -1 -1 0 1 -1 1 1
  [4,16,-1,1,-1,-1,0,-1,-1,0,1,-1,1,1],
// 4 16 1 1 -1 1 0 -1 -1 0 -1 -1 1 -1
  [4,16,1,1,-1,1,0,-1,-1,0,-1,-1,1,-1],
// 4 16 1 1 1 1 0 1 1 0 -1 1 1 -1
  [4,16,1,1,1,1,0,1,1,0,-1,1,1,-1],
];
module ldraw_lib__box5(step=0, col=false, unit=2/5, alt=false, line=0.2, solid=!$preview)
    makepoly(ldraw_lib__box5(solid), step=step, col=col, unit=unit, alt=alt, line=line, solid=solid);
ldraw_lib__box5(line=0.2);
// file: ../p/box4-1.scad
use <../lib.scad>
$fa=1; $fs=0.2;
function ldraw_lib__box4_1(realsolid=false) = [
// 0 Box with 4 Faces without 1 Edge
// 0 Name: box4-1.dat
// 0 Author: Tore Eriksson [Tore_Eriksson]
// 0 !LDRAW_ORG Primitive UPDATE 2012-01
// 0 !LICENSE Licensed under CC BY 2.0 and CC BY 4.0 : see CAreadme.txt
// 
// 0 BFC CERTIFY CCW
  [0,"BFC","CERTIFY"],
  [0,"BFC","CCW"],
// 
// 0 !HISTORY 1998-07-15 [PTadmin] Official Update 1998-07
// 0 !HISTORY 2002-04-05 [hafhead] Made BFC compliant
// 0 !HISTORY 2002-04-25 [PTadmin] Official Update 2002-02
// 0 !HISTORY 2007-06-24 [PTadmin] Header formatted for Contributor Agreement
// 0 !HISTORY 2008-07-01 [PTadmin] Official Update 2008-01
// 0 !HISTORY 2012-02-16 [Philo] Changed to CCW
// 0 !HISTORY 2012-03-30 [PTadmin] Official Update 2012-01
// 
// 
// 2 24 1 1 1 -1 1 1
  [2,24,1,1,1,-1,1,1],
// 2 24 -1 1 1 -1 1 -1
  [2,24,-1,1,1,-1,1,-1],
// 2 24 -1 1 -1 1 1 -1
  [2,24,-1,1,-1,1,1,-1],
// 2 24 1 1 -1 1 1 1
  [2,24,1,1,-1,1,1,1],
// 2 24 1 0 1 -1 0 1
  [2,24,1,0,1,-1,0,1],
// 2 24 -1 0 1 -1 0 -1
  [2,24,-1,0,1,-1,0,-1],
// 2 24 1 0 -1 1 0 1
  [2,24,1,0,-1,1,0,1],
// 2 24 1 0 1 1 1 1
  [2,24,1,0,1,1,1,1],
// 2 24 -1 0 1 -1 1 1
  [2,24,-1,0,1,-1,1,1],
// 2 24 1 0 -1 1 1 -1
  [2,24,1,0,-1,1,1,-1],
// 2 24 -1 0 -1 -1 1 -1
  [2,24,-1,0,-1,-1,1,-1],
// 4 16 -1 1 1 1 1 1 1 1 -1 -1 1 -1
  [4,16,-1,1,1,1,1,1,1,1,-1,-1,1,-1],
// 4 16 -1 1 1 -1 0 1 1 0 1 1 1 1
  [4,16,-1,1,1,-1,0,1,1,0,1,1,1,1],
// 4 16 -1 1 -1 -1 0 -1 -1 0 1 -1 1 1
  [4,16,-1,1,-1,-1,0,-1,-1,0,1,-1,1,1],
// 4 16 1 1 1 1 0 1 1 0 -1 1 1 -1
  [4,16,1,1,1,1,0,1,1,0,-1,1,1,-1],
];
module ldraw_lib__box4_1(step=0, col=false, unit=2/5, alt=false, line=0.2, solid=!$preview)
    makepoly(ldraw_lib__box4_1(solid), step=step, col=col, unit=unit, alt=alt, line=line, solid=solid);
ldraw_lib__box4_1(line=0.2);
// file: ../p/box3u2p.scad
use <../lib.scad>
$fa=1; $fs=0.2;
function ldraw_lib__box3u2p(realsolid=false) = [
// 0 Box with 3 Faces without 2 Parallel Edges
// 0 Name: box3u2p.dat
// 0 Author: Niels Karsdorp [nielsk]
// 0 !LDRAW_ORG Primitive UPDATE 2012-01
// 0 !LICENSE Licensed under CC BY 2.0 and CC BY 4.0 : see CAreadme.txt
// 
// 0 BFC CERTIFY CCW
  [0,"BFC","CERTIFY"],
  [0,"BFC","CCW"],
// 
// 0 !HISTORY 2003-03-12 [PTadmin] Official Update 2003-01
// 0 !HISTORY 2007-06-24 [PTadmin] Header formatted for Contributor Agreement
// 0 !HISTORY 2008-07-01 [PTadmin] Official Update 2008-01
// 0 !HISTORY 2012-02-16 [Philo] Changed to CCW
// 0 !HISTORY 2012-03-30 [PTadmin] Official Update 2012-01
// 
// 
// 2 24 1 1 1 -1 1 1
  [2,24,1,1,1,-1,1,1],
// 2 24 -1 1 -1 1 1 -1
  [2,24,-1,1,-1,1,1,-1],
// 2 24 1 0 1 -1 0 1
  [2,24,1,0,1,-1,0,1],
// 2 24 -1 0 -1 1 0 -1
  [2,24,-1,0,-1,1,0,-1],
// 2 24 1 1 1 1 1 -1
  [2,24,1,1,1,1,1,-1],
// 2 24 -1 1 1 -1 1 -1
  [2,24,-1,1,1,-1,1,-1],
// 2 24 1 1 1 1 0 1
  [2,24,1,1,1,1,0,1],
// 2 24 1 1 -1 1 0 -1
  [2,24,1,1,-1,1,0,-1],
// 2 24 -1 1 1 -1 0 1
  [2,24,-1,1,1,-1,0,1],
// 2 24 -1 1 -1 -1 0 -1
  [2,24,-1,1,-1,-1,0,-1],
// 4 16 -1 1 -1 -1 1 1 1 1 1 1 1 -1
  [4,16,-1,1,-1,-1,1,1,1,1,1,1,1,-1],
// 4 16 -1 1 1 -1 0 1 1 0 1 1 1 1
  [4,16,-1,1,1,-1,0,1,1,0,1,1,1,1],
// 4 16 1 1 -1 1 0 -1 -1 0 -1 -1 1 -1
  [4,16,1,1,-1,1,0,-1,-1,0,-1,-1,1,-1],
];
module ldraw_lib__box3u2p(step=0, col=false, unit=2/5, alt=false, line=0.2, solid=!$preview)
    makepoly(ldraw_lib__box3u2p(solid), step=step, col=col, unit=unit, alt=alt, line=line, solid=solid);
ldraw_lib__box3u2p(line=0.2);
// file: 3004.scad
use <../lib.scad>
use <s/3004s01.scad>
$fa=1; $fs=0.2;
function ldraw_lib__3004(realsolid=false) = [
// 0 Brick  1 x  2
// 0 Name: 3004.dat
// 0 Author: James Jessiman
// 0 !LDRAW_ORG Part UPDATE 2022-05
// 0 !LICENSE Licensed under CC BY 2.0 and CC BY 4.0 : see CAreadme.txt
// 
// 0 BFC CERTIFY CCW
  [0,"BFC","CERTIFY"],
  [0,"BFC","CCW"],
// 
// 0 !HISTORY 2001-10-26 [PTadmin] Official Update 2001-01
// 0 !HISTORY 2002-05-07 {unknown} BFC Certification
// 0 !HISTORY 2002-06-11 [PTadmin] Official Update 2002-03
// 0 !HISTORY 2007-05-07 [PTadmin] Header formatted for Contributor Agreement
// 0 !HISTORY 2008-07-01 [PTadmin] Official Update 2008-01
// 0 !HISTORY 2022-08-04 [MagFors] Using subfile
// 0 !HISTORY 2022-09-15 [PTadmin] Official Update 2022-05
// 
// 
// 1 16 0 0 0 1 0 0 0 1 0 0 0 1 s\3004s01.dat
  [1,16,0,0,0,1,0,0,0,1,0,0,0,1, ldraw_lib__s__3004s01(realsolid)],
// 4 16 -20 24 -10 20 24 -10 20 0 -10 -20 0 -10
  [4,16,-20,24,-10,20,24,-10,20,0,-10,-20,0,-10],
];
module ldraw_lib__3004(step=0, col=false, unit=2/5, alt=false, line=0.2, solid=!$preview)
    makepoly(ldraw_lib__3004(solid), step=step, col=col, unit=unit, alt=alt, line=line, solid=solid);
ldraw_lib__3004(line=0.2);
// file: s/20308s01.scad
use <../../lib.scad>
use <../../p/box3u2p.scad>
use <../../p/box4-1.scad>
use <../../p/box5.scad>
use <../../p/stud3.scad>
$fa=1; $fs=0.2;
function ldraw_lib__s__20308s01(realsolid=false) = [
// 0 ~Animal Head Cuboid without Decorated Surfaces
// 0 Name: s\20308s01.dat
// 0 Author: Philippe Hurbain [Philo]
// 0 !LDRAW_ORG Subpart UPDATE 2020-03
// 0 !LICENSE Licensed under CC BY 2.0 and CC BY 4.0 : see CAreadme.txt
// 
// 0 BFC CERTIFY CCW
  [0,"BFC","CERTIFY"],
  [0,"BFC","CCW"],
// 
// 0 !HISTORY 2016-03-18 {LEGO Digital Designer} Original part shape
// 0 !HISTORY 2020-04-16 [Philo] File preparation for LDraw Parts Tracker
// 0 !HISTORY 2020-12-29 [PTadmin] Official Update 2020-03
// 
// 
// 1 16 0 0 0 20 0 0 0 -16 0 0 0 10 box5.dat
  [1,16,0,0,0,20,0,0,0,-16,0,0,0,10, ldraw_lib__box5(realsolid)],
// 0 BFC INVERTNEXT
  [0,"BFC","INVERTNEXT"],
// 1 16 0 0 0 16 0 0 0 -12 0 0 0 6 box5.dat
  [1,16,0,0,0,16,0,0,0,-12,0,0,0,6, ldraw_lib__box5(realsolid)],
// 0 BFC INVERTNEXT
  [0,"BFC","INVERTNEXT"],
// 1 16 0 20 -29.5 3.5 0 0 0 -11 0 0 0 -7.5 box4-1.dat
  [1,16,0,20,-29.5,3.5,0,0,0,-11,0,0,0,-7.5, ldraw_lib__box4_1(realsolid)],
// 1 16 0 20 -18 0 0 16 0 -32.5 0 8 0 0 box3u2p.dat
  [1,16,0,20,-18,0,0,16,0,-32.5,0,8,0,0, ldraw_lib__box3u2p(realsolid)],
// 1 16 0 20 -33.5 0 0 7.5 0 -14.5 0 7.5 0 0 box3u2p.dat
  [1,16,0,20,-33.5,0,0,7.5,0,-14.5,0,7.5,0,0, ldraw_lib__box3u2p(realsolid)],
// 0 BFC INVERTNEXT
  [0,"BFC","INVERTNEXT"],
// 1 16 0 20 -16 0 0 12 0 -28 0 6 0 0 box3u2p.dat
  [1,16,0,20,-16,0,0,12,0,-28,0,6,0,0, ldraw_lib__box3u2p(realsolid)],
// 1 16 11 -12.5 -12 3.7 0 0 0 -7.5 0 0 0 2 box5.dat
  [1,16,11,-12.5,-12,3.7,0,0,0,-7.5,0,0,0,2, ldraw_lib__box5(realsolid)],
// 1 16 -11 -12.5 -12 3.7 0 0 0 -7.5 0 0 0 2 box5.dat
  [1,16,-11,-12.5,-12,3.7,0,0,0,-7.5,0,0,0,2, ldraw_lib__box5(realsolid)],
// 1 16 0 -12 0 1 0 0 0 -3 0 0 0 1 stud3.dat
  [1,16,0,-12,0,1,0,0,0,-3,0,0,0,1, ldraw_lib__stud3(realsolid)],
// 4 16 12 20 -10 12 -8 -10 16 -12.5 -10 16 20 -10
  [4,16,12,20,-10,12,-8,-10,16,-12.5,-10,16,20,-10],
// 4 16 -16 20 -10 -16 -12.5 -10 -12 -8 -10 -12 20 -10
  [4,16,-16,20,-10,-16,-12.5,-10,-12,-8,-10,-12,20,-10],
// 4 16 16 20 -26 12 20 -22 12 20 -10 16 20 -10
  [4,16,16,20,-26,12,20,-22,12,20,-10,16,20,-10],
// 4 16 -12 20 -22 -16 20 -26 -16 20 -10 -12 20 -10
  [4,16,-12,20,-22,-16,20,-26,-16,20,-10,-12,20,-10],
// 2 24 12 20 -10 16 20 -10
  [2,24,12,20,-10,16,20,-10],
// 2 24 -16 20 -10 -12 20 -10
  [2,24,-16,20,-10,-12,20,-10],
// 4 16 16 0 -6 20 0 -10 -20 0 -10 -16 0 -6
  [4,16,16,0,-6,20,0,-10,-20,0,-10,-16,0,-6],
// 4 16 -16 0 -6 -20 0 -10 -20 0 10 -16 0 6
  [4,16,-16,0,-6,-20,0,-10,-20,0,10,-16,0,6],
// 4 16 16 0 6 -16 0 6 -20 0 10 20 0 10
  [4,16,16,0,6,-16,0,6,-20,0,10,20,0,10],
// 4 16 20 0 -10 16 0 -6 16 0 6 20 0 10
  [4,16,20,0,-10,16,0,-6,16,0,6,20,0,10],
// 4 16 -3.5 20 -22 -7.5 20 -26 -16 20 -26 -12 20 -22
  [4,16,-3.5,20,-22,-7.5,20,-26,-16,20,-26,-12,20,-22],
// 4 16 -7.5 20 -41 -7.5 20 -26 -3.5 20 -22 -3.5 20 -37
  [4,16,-7.5,20,-41,-7.5,20,-26,-3.5,20,-22,-3.5,20,-37],
// 4 16 -7.5 20 -41 -3.5 20 -37 3.5 20 -37 7.5 20 -41
  [4,16,-7.5,20,-41,-3.5,20,-37,3.5,20,-37,7.5,20,-41],
// 4 16 7.5 20 -41 3.5 20 -37 3.5 20 -22 7.5 20 -26
  [4,16,7.5,20,-41,3.5,20,-37,3.5,20,-22,7.5,20,-26],
// 4 16 7.5 20 -26 3.5 20 -22 12 20 -22 16 20 -26
  [4,16,7.5,20,-26,3.5,20,-22,12,20,-22,16,20,-26],
// 4 16 12 20 -22 3.5 20 -22 3.5 9 -22 12 -8 -22
  [4,16,12,20,-22,3.5,20,-22,3.5,9,-22,12,-8,-22],
// 4 16 -12 -8 -22 12 -8 -22 3.5 9 -22 -3.5 9 -22
  [4,16,-12,-8,-22,12,-8,-22,3.5,9,-22,-3.5,9,-22],
// 4 16 -12 -8 -22 -3.5 9 -22 -3.5 20 -22 -12 20 -22
  [4,16,-12,-8,-22,-3.5,9,-22,-3.5,20,-22,-12,20,-22],
// 2 24 12 20 -22 3.5 20 -22
  [2,24,12,20,-22,3.5,20,-22],
// 2 24 -3.5 20 -22 -12 20 -22
  [2,24,-3.5,20,-22,-12,20,-22],
// 2 24 -7.5 20 -26 -16 20 -26
  [2,24,-7.5,20,-26,-16,20,-26],
// 2 24 16 20 -26 7.5 20 -26
  [2,24,16,20,-26,7.5,20,-26],
// 2 24 7.5 20 -41 -7.5 20 -41
  [2,24,7.5,20,-41,-7.5,20,-41],
];
module ldraw_lib__s__20308s01(step=0, col=false, unit=2/5, alt=false, line=0.2, solid=!$preview)
    makepoly(ldraw_lib__s__20308s01(solid), step=step, col=col, unit=unit, alt=alt, line=line, solid=solid);
ldraw_lib__s__20308s01(line=0.2);
// main file
use <../lib.scad>
use <s/20308s01.scad>
$fa=1; $fs=0.2;
function ldraw_lib__20308(realsolid=false) = [
// 0 Animal Head Cuboid
// 0 Name: 20308.dat
// 0 Author: Philippe Hurbain [Philo]
// 0 !LDRAW_ORG Part UPDATE 2020-03
// 0 !LICENSE Licensed under CC BY 2.0 and CC BY 4.0 : see CAreadme.txt
// 
// 0 BFC CERTIFY CCW
  [0,"BFC","CERTIFY"],
  [0,"BFC","CCW"],
// 
// 0 !KEYWORDS Dog, Minecraft, Wolf
// 
// 0 !HISTORY 2016-03-18 {LEGO Digital Designer} Original part shape
// 0 !HISTORY 2020-04-16 [Philo] File preparation for LDraw Parts Tracker
// 0 !HISTORY 2020-12-29 [PTadmin] Official Update 2020-03
// 
// 
// 1 16 0 0 0 1 0 0 0 1 0 0 0 1 s\20308s01.dat
  [1,16,0,0,0,1,0,0,0,1,0,0,0,1, ldraw_lib__s__20308s01(realsolid)],
// 
// 0 // front
// 4 16 7.5 5.5 -41 -7.5 5.5 -41 -7.5 20 -41 7.5 20 -41
  [4,16,7.5,5.5,-41,-7.5,5.5,-41,-7.5,20,-41,7.5,20,-41],
// 4 16 -16 -12.5 -26 -16 20 -26 -7.5 20 -26 -7.5 5.5 -26
  [4,16,-16,-12.5,-26,-16,20,-26,-7.5,20,-26,-7.5,5.5,-26],
// 4 16 -16 -12.5 -26 -7.5 5.5 -26 7.5 5.5 -26 16 -12.5 -26
  [4,16,-16,-12.5,-26,-7.5,5.5,-26,7.5,5.5,-26,16,-12.5,-26],
// 4 16 16 -12.5 -26 7.5 5.5 -26 7.5 20 -26 16 20 -26
  [4,16,16,-12.5,-26,7.5,5.5,-26,7.5,20,-26,16,20,-26],
];
module ldraw_lib__20308(step=0, col=false, unit=2/5, alt=false, line=0.2, solid=!$preview)
    makepoly(ldraw_lib__20308(solid), step=step, col=col, unit=unit, alt=alt, line=line, solid=solid);
ldraw_lib__20308(line=0.2);
